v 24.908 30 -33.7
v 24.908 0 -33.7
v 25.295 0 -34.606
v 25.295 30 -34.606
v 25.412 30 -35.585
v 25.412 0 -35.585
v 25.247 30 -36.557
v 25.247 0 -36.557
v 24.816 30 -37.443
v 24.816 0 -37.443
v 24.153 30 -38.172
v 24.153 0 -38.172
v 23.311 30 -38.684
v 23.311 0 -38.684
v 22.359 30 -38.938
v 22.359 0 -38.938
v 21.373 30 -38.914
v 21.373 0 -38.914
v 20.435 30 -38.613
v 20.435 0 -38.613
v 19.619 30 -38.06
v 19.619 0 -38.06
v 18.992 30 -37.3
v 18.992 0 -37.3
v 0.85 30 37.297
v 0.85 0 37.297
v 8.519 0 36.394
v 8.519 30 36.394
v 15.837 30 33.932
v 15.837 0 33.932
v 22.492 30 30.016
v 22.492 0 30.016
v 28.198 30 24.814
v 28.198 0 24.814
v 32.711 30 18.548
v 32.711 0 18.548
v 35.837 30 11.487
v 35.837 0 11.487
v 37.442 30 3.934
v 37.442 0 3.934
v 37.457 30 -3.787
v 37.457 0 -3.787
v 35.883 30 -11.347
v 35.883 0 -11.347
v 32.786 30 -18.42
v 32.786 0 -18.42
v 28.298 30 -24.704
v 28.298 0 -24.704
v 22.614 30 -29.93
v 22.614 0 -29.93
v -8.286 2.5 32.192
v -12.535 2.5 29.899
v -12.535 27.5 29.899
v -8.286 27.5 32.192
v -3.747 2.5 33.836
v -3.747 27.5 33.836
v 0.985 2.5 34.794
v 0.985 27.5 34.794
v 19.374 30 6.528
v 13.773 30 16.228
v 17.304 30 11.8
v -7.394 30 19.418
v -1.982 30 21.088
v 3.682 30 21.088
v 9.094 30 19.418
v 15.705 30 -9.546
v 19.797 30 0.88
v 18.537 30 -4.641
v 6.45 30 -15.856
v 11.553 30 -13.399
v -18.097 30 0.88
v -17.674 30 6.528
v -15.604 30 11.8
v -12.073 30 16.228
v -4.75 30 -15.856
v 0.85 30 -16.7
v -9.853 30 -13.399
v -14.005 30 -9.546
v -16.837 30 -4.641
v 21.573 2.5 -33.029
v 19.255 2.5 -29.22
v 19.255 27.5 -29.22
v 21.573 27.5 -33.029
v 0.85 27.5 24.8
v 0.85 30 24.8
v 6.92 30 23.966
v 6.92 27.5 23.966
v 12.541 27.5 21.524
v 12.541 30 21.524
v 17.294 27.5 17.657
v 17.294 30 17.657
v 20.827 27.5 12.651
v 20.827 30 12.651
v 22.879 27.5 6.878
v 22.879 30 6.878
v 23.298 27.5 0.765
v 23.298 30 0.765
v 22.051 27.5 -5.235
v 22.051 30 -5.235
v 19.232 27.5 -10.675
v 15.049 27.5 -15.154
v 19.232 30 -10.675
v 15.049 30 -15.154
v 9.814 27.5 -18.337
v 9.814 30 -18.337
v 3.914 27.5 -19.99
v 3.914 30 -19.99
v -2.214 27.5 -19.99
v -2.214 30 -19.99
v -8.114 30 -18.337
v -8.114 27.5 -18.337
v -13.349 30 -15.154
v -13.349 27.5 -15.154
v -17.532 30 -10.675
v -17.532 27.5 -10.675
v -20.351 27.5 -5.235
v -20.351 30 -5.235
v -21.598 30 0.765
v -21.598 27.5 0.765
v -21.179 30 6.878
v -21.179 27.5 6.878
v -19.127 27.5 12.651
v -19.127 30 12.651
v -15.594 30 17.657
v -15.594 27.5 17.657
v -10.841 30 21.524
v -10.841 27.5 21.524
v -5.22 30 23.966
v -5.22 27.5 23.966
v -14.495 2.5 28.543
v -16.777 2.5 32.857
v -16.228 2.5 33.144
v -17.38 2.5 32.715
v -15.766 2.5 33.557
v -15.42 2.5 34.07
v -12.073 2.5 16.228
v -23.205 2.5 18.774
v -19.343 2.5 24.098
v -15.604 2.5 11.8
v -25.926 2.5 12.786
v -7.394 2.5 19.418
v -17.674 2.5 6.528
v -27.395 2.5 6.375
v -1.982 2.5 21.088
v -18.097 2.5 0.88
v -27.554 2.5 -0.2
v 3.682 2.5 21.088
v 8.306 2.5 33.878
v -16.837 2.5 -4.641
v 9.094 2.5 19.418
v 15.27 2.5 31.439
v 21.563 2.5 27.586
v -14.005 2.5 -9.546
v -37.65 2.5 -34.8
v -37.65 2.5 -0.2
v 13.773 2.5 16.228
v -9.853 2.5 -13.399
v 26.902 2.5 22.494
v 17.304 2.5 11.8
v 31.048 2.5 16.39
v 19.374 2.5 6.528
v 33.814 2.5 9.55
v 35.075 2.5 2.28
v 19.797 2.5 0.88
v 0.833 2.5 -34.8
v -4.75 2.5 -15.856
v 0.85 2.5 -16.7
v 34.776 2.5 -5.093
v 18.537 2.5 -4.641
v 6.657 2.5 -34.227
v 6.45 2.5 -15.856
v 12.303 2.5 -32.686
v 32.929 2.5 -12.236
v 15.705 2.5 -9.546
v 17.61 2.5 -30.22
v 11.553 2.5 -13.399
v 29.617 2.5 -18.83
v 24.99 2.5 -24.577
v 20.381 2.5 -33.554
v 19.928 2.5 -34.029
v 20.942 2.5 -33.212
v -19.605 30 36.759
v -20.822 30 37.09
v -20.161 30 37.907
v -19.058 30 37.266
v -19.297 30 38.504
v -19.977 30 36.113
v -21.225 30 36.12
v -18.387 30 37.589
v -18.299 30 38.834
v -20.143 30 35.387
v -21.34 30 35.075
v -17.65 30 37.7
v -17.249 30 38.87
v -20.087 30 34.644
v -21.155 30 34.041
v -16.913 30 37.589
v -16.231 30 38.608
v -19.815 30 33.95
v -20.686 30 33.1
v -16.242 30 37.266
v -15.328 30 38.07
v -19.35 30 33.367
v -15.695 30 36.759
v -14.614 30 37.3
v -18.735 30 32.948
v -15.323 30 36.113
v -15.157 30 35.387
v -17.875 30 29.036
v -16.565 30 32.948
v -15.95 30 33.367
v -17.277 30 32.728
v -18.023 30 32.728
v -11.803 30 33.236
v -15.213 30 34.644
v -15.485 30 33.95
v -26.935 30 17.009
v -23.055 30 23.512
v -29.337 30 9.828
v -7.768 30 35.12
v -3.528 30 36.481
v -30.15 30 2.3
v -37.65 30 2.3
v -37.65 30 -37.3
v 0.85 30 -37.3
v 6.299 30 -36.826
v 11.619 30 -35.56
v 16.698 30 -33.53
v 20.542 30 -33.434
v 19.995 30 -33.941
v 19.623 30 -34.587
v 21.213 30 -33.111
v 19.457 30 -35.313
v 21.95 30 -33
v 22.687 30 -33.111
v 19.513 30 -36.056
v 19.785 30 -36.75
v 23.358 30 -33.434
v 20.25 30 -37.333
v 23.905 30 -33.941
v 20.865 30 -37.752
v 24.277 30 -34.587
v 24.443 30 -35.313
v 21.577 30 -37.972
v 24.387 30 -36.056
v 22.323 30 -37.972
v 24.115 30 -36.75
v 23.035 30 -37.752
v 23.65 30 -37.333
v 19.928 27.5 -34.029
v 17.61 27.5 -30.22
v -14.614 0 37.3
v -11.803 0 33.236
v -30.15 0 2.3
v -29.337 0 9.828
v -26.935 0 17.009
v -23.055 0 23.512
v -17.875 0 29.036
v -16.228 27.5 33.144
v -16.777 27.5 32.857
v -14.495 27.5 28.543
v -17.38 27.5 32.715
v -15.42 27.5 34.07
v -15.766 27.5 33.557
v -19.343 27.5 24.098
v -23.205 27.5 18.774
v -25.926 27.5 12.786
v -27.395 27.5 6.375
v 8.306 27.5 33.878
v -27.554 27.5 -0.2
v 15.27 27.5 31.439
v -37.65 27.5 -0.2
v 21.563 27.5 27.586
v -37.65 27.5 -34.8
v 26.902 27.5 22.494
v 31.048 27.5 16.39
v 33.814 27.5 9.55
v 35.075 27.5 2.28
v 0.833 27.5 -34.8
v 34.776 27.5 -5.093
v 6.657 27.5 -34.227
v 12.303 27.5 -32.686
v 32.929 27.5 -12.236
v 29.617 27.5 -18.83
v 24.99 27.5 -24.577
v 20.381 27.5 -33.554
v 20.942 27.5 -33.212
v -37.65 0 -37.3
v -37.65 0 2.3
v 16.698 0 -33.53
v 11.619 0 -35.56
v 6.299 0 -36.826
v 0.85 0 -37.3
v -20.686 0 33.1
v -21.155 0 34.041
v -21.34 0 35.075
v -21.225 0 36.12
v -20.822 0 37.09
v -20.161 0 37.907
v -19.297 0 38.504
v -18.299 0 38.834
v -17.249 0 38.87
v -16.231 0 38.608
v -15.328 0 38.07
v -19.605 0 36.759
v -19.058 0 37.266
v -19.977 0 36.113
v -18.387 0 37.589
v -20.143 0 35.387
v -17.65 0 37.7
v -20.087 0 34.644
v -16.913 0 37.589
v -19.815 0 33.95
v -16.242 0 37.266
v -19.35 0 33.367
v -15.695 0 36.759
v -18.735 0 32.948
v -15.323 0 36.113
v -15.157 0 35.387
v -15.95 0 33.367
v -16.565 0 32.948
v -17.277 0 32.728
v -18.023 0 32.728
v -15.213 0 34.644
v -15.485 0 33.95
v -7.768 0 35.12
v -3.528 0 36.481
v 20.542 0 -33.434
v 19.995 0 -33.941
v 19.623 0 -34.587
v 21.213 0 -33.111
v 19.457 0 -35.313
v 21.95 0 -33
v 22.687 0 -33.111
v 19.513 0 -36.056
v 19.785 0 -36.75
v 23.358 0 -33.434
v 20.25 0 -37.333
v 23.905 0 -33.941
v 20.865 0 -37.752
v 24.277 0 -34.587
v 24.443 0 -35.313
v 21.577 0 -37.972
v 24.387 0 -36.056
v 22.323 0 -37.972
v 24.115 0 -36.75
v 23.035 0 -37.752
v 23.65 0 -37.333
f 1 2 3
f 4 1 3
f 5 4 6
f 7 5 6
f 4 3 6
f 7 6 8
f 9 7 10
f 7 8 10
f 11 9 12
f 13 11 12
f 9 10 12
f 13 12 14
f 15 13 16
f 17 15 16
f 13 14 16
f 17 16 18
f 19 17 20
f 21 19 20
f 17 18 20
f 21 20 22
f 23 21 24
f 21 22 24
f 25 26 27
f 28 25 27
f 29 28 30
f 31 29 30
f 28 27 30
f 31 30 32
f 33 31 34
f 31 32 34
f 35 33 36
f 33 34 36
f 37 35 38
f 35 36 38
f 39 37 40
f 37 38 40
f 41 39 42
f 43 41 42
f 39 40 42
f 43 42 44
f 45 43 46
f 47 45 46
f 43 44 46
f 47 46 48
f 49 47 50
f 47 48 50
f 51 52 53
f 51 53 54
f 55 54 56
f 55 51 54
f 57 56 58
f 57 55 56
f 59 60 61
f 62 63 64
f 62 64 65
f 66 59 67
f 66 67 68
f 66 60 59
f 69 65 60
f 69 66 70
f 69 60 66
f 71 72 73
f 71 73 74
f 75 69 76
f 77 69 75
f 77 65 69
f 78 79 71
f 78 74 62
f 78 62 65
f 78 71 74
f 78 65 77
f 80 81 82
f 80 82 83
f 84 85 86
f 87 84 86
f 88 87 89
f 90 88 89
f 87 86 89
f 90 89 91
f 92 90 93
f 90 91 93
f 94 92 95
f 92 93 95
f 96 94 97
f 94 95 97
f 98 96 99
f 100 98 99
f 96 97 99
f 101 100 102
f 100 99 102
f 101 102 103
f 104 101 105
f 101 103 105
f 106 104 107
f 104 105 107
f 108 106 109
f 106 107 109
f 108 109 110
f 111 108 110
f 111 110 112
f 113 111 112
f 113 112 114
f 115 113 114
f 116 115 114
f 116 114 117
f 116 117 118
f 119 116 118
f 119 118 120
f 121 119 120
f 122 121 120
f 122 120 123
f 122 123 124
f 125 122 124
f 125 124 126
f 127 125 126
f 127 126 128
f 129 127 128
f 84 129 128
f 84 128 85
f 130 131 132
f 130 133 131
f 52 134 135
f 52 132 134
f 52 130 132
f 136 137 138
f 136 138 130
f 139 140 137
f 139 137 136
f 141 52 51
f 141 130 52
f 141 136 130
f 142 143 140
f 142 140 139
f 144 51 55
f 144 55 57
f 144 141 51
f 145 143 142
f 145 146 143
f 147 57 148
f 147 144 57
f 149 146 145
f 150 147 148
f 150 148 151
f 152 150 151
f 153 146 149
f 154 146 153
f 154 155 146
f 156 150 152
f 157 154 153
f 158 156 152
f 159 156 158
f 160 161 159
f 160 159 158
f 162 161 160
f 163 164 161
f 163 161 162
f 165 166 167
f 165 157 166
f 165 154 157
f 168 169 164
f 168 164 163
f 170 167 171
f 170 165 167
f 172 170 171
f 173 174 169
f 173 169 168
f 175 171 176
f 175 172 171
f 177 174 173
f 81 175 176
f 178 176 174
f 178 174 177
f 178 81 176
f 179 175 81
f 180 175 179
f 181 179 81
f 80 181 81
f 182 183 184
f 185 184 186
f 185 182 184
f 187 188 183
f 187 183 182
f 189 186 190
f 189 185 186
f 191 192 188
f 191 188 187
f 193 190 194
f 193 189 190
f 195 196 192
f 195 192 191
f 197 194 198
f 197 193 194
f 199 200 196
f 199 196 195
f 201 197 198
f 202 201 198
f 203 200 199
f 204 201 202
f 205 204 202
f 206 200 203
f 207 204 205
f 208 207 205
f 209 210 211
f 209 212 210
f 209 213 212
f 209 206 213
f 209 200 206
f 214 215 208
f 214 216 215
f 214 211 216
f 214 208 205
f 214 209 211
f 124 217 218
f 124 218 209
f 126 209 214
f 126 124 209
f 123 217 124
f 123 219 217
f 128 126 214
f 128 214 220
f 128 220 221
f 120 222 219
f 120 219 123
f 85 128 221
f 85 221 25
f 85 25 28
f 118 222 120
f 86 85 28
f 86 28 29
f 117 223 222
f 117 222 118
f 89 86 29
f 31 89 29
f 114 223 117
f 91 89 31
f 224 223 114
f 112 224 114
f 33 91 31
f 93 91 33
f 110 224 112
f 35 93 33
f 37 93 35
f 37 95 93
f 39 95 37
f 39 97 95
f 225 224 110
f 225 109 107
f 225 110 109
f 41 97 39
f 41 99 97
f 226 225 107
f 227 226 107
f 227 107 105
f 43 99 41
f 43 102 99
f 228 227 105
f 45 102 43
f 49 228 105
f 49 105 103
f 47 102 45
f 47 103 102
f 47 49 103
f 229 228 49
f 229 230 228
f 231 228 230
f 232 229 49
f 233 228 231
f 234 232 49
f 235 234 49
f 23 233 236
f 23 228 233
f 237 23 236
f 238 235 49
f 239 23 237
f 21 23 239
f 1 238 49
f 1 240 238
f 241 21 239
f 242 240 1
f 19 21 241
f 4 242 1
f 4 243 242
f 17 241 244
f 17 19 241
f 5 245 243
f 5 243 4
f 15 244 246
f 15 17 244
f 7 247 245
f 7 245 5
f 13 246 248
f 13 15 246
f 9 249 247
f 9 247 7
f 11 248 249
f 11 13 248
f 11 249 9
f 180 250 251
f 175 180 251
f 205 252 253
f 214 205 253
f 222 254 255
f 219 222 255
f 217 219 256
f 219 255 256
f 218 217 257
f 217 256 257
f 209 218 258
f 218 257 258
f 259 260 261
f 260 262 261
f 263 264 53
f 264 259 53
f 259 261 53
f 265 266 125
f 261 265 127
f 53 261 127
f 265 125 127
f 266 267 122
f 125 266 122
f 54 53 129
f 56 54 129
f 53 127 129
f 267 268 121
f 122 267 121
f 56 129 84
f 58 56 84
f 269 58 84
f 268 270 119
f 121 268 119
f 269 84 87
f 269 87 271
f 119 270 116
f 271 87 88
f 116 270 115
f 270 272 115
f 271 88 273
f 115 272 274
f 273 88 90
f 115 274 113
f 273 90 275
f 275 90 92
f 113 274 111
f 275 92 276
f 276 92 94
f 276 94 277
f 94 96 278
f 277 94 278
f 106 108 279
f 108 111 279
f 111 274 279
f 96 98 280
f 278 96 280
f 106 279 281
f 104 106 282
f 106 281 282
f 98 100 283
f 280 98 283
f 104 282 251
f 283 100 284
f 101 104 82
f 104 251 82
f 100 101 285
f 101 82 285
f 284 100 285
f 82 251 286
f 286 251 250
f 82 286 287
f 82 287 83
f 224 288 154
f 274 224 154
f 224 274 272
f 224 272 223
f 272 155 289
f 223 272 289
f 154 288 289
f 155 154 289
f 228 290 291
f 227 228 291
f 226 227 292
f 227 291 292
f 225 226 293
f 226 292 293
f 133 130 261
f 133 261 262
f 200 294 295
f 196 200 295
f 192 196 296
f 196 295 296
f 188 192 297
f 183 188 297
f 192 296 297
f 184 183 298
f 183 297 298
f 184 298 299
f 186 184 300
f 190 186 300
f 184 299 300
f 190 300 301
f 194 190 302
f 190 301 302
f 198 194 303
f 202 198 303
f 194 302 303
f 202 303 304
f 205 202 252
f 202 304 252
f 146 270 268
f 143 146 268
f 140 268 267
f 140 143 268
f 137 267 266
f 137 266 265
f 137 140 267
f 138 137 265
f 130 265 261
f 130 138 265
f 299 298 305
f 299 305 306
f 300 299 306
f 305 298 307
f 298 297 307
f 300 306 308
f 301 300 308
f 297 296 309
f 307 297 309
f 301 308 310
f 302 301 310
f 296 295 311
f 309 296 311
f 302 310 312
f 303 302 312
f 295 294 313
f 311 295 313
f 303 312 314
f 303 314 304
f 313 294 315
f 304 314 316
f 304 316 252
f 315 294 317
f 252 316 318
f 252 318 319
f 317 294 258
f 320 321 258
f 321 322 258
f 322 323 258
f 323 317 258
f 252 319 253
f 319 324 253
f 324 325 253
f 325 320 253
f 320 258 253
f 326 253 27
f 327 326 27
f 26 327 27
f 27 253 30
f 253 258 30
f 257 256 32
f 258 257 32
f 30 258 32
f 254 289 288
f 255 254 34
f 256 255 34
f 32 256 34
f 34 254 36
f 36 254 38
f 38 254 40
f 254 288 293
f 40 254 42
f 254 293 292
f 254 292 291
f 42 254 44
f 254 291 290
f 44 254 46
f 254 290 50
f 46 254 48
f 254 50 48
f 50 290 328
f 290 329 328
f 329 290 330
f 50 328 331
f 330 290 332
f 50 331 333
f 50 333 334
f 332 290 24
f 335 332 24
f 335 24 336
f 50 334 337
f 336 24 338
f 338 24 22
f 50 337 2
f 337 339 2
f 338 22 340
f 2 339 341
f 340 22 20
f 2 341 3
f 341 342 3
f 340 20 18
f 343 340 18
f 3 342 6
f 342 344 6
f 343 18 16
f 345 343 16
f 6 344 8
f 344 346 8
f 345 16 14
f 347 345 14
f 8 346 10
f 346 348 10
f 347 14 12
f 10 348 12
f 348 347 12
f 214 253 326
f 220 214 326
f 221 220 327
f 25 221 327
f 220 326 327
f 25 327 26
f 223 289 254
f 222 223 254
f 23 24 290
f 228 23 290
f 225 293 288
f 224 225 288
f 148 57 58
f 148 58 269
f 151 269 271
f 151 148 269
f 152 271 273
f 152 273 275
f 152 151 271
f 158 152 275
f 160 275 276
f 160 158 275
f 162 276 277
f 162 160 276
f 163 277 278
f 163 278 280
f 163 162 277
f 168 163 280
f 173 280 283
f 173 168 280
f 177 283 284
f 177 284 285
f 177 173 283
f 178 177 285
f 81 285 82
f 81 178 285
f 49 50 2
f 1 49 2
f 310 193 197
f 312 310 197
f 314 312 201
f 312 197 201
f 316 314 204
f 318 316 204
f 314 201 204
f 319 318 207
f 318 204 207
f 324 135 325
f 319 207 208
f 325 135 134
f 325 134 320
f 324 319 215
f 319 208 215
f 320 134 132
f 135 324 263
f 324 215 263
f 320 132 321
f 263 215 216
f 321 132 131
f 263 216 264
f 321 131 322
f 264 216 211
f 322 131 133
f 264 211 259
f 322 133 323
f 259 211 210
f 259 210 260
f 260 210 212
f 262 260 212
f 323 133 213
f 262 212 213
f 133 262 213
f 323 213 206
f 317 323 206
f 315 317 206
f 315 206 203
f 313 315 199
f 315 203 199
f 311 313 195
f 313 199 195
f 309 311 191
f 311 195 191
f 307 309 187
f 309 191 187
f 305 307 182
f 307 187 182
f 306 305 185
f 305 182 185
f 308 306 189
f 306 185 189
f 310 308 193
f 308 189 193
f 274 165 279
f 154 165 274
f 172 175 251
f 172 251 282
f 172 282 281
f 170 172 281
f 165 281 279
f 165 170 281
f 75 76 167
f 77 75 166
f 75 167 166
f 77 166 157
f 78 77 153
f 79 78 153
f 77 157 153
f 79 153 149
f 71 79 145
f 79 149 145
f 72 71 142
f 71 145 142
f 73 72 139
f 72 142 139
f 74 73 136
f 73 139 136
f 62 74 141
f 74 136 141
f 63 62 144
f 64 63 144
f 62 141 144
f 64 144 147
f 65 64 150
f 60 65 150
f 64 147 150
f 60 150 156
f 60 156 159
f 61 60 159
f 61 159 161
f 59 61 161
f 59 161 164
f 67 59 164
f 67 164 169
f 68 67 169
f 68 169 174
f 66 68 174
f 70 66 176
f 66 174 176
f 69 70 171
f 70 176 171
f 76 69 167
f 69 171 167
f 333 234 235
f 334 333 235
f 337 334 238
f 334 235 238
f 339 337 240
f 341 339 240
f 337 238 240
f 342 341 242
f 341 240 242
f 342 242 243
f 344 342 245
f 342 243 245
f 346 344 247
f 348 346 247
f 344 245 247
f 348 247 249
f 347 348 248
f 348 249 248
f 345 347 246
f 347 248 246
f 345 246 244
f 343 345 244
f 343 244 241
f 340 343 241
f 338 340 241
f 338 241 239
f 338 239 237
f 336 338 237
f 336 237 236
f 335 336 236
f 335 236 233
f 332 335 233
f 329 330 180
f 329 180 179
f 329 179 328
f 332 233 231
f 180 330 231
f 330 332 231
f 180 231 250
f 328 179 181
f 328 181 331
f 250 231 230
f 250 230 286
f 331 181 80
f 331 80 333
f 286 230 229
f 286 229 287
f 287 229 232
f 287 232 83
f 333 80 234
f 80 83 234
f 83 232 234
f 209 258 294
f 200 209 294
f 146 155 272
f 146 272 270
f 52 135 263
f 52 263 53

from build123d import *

# Parameters (mm, degrees)
BOSS_EXTRUDE1_DEPTH = 30
SHELL1_START        = 2.5
SHELL1_DEPTH        = 25
SKETCH2_R           = 22.5
CUT_EXTRUDE1_DEPTH  = 14
SKETCH3_R           = 19
BOSS_EXTRUDE2_DEPTH = 27.5
SKETCH4_R           = 2.5
CUT_EXTRUDE2_DEPTH  = 62.932269548


# Read off the part's stored shape, not the designer's step: Shell1
with BuildPart() as part:
    # Sketch1 → Boss-Extrude1 (new body)
    with BuildSketch(Plane(origin=(0, 0, 0), x_dir=(1, 0, 0), z_dir=(0, 1, 0))):
        with BuildLine():
            Line((0.85, 37.3), (-37.65, 37.3))
            Line((-37.65, 37.3), (-37.65, -2.3))
            Line((-37.65, -2.3), (-30.15, -2.3))
            ThreePointArc((-30.15, -2.3), (-26.934732226, -17.009377839), (-17.875408278, -29.035698675))
            Line((-17.875408278, -29.035698675), (-20.686355111, -33.1))
            ThreePointArc((-20.686355111, -33.1), (-19.75, -38.236355111), (-14.613644889, -37.3))
            Line((-14.613644889, -37.3), (-11.802698056, -33.235698675))
            ThreePointArc((-11.802698056, -33.235698675), (-5.669414959, -35.867701083), (0.85, -37.296626142))
            ThreePointArc((0.85, -37.296626142), (35.836650455, -11.487166691), (22.613530114, 29.929532788))
            Line((22.613530114, 29.929532788), (24.907961743, 33.7))
            ThreePointArc((24.907961743, 33.7), (23.75, 38.457961743), (18.992038257, 37.3))
            Line((18.992038257, 37.3), (16.697606627, 33.529532788))
            ThreePointArc((16.697606627, 33.529532788), (8.982141398, 36.290429758), (0.85, 37.3))
        make_face()
    extrude(amount=BOSS_EXTRUDE1_DEPTH)

    # Shell1 outline → Shell1 (cut)
    with BuildSketch(Plane(origin=(0, 0, 0), x_dir=(1, 0, 0), z_dir=(0, 1, 0)).offset(SHELL1_START)):
        with BuildLine():
            Line((-16.669788137, -35.877932863), (-12.534694931, -29.899070296))
            ThreePointArc((-12.534694931, -29.899070296), (-6.046851448, -33.097630874), (0.984836041, -34.794178509))
            ThreePointArc((0.984836041, -34.794178509), (33.813651871, -9.549674864), (19.255072264, 29.219692849))
            Line((19.255072264, 29.219692849), (22.772305532, 34.999604766))
            ThreePointArc((22.772305532, 34.999604766), (22.450395234, 36.322305532), (21.127694468, 36.000395234))
            Line((21.127694468, 36.000395234), (17.610461199, 30.220483316))
            ThreePointArc((17.610461199, 30.220483316), (9.512351913, 33.575155698), (0.832895868, 34.8))
            Line((0.832895868, 34.8), (-37.65, 34.8))
            Line((-37.65, 34.8), (-37.65, 0.2))
            Line((-37.65, 0.2), (-27.554453191, 0.2))
            ThreePointArc((-27.554453191, 0.2), (-24.716370884, -15.848855872), (-14.495118657, -28.543204571))
            Line((-14.495118657, -28.543204571), (-18.630211863, -34.522067137))
            ThreePointArc((-18.630211863, -34.522067137), (-18.327932863, -36.180211863), (-16.669788137, -35.877932863))
        make_face()
    extrude(amount=SHELL1_DEPTH, mode=Mode.SUBTRACT)

    # Sketch2 → Cut-Extrude1 (cut)
    with BuildSketch(Plane(origin=(0, 30, 0), x_dir=(1, 0, 0), z_dir=(0, 1, 0))):
        with Locations(Location((0.85, -2.3, 0), (0, 0, 270))):
            Circle(SKETCH2_R)
    extrude(amount=-CUT_EXTRUDE1_DEPTH, mode=Mode.SUBTRACT)

    # Sketch3 → Boss-Extrude2 (add)
    with BuildSketch(Plane(origin=(0, 2.5, 0), x_dir=(1, 0, 0), z_dir=(0, 1, 0))):
        with Locations(Location((0.85, -2.3, 0), (0, 0, 90))):
            Circle(SKETCH3_R)
    extrude(amount=BOSS_EXTRUDE2_DEPTH)

    # Sketch4 → Cut-Extrude2 (cut, through all)
    with BuildSketch(Plane(origin=(0, 30, 0), x_dir=(1, 0, 0), z_dir=(0, 1, 0))):
        with Locations(Location((21.95, 35.5, 0), (0, 0, 270))):
            Circle(SKETCH4_R)
        with Locations(Location((-17.65, -35.2, 0), (0, 0, 270))):
            Circle(SKETCH4_R)
    extrude(amount=-CUT_EXTRUDE2_DEPTH, mode=Mode.SUBTRACT)


solid = part.part
